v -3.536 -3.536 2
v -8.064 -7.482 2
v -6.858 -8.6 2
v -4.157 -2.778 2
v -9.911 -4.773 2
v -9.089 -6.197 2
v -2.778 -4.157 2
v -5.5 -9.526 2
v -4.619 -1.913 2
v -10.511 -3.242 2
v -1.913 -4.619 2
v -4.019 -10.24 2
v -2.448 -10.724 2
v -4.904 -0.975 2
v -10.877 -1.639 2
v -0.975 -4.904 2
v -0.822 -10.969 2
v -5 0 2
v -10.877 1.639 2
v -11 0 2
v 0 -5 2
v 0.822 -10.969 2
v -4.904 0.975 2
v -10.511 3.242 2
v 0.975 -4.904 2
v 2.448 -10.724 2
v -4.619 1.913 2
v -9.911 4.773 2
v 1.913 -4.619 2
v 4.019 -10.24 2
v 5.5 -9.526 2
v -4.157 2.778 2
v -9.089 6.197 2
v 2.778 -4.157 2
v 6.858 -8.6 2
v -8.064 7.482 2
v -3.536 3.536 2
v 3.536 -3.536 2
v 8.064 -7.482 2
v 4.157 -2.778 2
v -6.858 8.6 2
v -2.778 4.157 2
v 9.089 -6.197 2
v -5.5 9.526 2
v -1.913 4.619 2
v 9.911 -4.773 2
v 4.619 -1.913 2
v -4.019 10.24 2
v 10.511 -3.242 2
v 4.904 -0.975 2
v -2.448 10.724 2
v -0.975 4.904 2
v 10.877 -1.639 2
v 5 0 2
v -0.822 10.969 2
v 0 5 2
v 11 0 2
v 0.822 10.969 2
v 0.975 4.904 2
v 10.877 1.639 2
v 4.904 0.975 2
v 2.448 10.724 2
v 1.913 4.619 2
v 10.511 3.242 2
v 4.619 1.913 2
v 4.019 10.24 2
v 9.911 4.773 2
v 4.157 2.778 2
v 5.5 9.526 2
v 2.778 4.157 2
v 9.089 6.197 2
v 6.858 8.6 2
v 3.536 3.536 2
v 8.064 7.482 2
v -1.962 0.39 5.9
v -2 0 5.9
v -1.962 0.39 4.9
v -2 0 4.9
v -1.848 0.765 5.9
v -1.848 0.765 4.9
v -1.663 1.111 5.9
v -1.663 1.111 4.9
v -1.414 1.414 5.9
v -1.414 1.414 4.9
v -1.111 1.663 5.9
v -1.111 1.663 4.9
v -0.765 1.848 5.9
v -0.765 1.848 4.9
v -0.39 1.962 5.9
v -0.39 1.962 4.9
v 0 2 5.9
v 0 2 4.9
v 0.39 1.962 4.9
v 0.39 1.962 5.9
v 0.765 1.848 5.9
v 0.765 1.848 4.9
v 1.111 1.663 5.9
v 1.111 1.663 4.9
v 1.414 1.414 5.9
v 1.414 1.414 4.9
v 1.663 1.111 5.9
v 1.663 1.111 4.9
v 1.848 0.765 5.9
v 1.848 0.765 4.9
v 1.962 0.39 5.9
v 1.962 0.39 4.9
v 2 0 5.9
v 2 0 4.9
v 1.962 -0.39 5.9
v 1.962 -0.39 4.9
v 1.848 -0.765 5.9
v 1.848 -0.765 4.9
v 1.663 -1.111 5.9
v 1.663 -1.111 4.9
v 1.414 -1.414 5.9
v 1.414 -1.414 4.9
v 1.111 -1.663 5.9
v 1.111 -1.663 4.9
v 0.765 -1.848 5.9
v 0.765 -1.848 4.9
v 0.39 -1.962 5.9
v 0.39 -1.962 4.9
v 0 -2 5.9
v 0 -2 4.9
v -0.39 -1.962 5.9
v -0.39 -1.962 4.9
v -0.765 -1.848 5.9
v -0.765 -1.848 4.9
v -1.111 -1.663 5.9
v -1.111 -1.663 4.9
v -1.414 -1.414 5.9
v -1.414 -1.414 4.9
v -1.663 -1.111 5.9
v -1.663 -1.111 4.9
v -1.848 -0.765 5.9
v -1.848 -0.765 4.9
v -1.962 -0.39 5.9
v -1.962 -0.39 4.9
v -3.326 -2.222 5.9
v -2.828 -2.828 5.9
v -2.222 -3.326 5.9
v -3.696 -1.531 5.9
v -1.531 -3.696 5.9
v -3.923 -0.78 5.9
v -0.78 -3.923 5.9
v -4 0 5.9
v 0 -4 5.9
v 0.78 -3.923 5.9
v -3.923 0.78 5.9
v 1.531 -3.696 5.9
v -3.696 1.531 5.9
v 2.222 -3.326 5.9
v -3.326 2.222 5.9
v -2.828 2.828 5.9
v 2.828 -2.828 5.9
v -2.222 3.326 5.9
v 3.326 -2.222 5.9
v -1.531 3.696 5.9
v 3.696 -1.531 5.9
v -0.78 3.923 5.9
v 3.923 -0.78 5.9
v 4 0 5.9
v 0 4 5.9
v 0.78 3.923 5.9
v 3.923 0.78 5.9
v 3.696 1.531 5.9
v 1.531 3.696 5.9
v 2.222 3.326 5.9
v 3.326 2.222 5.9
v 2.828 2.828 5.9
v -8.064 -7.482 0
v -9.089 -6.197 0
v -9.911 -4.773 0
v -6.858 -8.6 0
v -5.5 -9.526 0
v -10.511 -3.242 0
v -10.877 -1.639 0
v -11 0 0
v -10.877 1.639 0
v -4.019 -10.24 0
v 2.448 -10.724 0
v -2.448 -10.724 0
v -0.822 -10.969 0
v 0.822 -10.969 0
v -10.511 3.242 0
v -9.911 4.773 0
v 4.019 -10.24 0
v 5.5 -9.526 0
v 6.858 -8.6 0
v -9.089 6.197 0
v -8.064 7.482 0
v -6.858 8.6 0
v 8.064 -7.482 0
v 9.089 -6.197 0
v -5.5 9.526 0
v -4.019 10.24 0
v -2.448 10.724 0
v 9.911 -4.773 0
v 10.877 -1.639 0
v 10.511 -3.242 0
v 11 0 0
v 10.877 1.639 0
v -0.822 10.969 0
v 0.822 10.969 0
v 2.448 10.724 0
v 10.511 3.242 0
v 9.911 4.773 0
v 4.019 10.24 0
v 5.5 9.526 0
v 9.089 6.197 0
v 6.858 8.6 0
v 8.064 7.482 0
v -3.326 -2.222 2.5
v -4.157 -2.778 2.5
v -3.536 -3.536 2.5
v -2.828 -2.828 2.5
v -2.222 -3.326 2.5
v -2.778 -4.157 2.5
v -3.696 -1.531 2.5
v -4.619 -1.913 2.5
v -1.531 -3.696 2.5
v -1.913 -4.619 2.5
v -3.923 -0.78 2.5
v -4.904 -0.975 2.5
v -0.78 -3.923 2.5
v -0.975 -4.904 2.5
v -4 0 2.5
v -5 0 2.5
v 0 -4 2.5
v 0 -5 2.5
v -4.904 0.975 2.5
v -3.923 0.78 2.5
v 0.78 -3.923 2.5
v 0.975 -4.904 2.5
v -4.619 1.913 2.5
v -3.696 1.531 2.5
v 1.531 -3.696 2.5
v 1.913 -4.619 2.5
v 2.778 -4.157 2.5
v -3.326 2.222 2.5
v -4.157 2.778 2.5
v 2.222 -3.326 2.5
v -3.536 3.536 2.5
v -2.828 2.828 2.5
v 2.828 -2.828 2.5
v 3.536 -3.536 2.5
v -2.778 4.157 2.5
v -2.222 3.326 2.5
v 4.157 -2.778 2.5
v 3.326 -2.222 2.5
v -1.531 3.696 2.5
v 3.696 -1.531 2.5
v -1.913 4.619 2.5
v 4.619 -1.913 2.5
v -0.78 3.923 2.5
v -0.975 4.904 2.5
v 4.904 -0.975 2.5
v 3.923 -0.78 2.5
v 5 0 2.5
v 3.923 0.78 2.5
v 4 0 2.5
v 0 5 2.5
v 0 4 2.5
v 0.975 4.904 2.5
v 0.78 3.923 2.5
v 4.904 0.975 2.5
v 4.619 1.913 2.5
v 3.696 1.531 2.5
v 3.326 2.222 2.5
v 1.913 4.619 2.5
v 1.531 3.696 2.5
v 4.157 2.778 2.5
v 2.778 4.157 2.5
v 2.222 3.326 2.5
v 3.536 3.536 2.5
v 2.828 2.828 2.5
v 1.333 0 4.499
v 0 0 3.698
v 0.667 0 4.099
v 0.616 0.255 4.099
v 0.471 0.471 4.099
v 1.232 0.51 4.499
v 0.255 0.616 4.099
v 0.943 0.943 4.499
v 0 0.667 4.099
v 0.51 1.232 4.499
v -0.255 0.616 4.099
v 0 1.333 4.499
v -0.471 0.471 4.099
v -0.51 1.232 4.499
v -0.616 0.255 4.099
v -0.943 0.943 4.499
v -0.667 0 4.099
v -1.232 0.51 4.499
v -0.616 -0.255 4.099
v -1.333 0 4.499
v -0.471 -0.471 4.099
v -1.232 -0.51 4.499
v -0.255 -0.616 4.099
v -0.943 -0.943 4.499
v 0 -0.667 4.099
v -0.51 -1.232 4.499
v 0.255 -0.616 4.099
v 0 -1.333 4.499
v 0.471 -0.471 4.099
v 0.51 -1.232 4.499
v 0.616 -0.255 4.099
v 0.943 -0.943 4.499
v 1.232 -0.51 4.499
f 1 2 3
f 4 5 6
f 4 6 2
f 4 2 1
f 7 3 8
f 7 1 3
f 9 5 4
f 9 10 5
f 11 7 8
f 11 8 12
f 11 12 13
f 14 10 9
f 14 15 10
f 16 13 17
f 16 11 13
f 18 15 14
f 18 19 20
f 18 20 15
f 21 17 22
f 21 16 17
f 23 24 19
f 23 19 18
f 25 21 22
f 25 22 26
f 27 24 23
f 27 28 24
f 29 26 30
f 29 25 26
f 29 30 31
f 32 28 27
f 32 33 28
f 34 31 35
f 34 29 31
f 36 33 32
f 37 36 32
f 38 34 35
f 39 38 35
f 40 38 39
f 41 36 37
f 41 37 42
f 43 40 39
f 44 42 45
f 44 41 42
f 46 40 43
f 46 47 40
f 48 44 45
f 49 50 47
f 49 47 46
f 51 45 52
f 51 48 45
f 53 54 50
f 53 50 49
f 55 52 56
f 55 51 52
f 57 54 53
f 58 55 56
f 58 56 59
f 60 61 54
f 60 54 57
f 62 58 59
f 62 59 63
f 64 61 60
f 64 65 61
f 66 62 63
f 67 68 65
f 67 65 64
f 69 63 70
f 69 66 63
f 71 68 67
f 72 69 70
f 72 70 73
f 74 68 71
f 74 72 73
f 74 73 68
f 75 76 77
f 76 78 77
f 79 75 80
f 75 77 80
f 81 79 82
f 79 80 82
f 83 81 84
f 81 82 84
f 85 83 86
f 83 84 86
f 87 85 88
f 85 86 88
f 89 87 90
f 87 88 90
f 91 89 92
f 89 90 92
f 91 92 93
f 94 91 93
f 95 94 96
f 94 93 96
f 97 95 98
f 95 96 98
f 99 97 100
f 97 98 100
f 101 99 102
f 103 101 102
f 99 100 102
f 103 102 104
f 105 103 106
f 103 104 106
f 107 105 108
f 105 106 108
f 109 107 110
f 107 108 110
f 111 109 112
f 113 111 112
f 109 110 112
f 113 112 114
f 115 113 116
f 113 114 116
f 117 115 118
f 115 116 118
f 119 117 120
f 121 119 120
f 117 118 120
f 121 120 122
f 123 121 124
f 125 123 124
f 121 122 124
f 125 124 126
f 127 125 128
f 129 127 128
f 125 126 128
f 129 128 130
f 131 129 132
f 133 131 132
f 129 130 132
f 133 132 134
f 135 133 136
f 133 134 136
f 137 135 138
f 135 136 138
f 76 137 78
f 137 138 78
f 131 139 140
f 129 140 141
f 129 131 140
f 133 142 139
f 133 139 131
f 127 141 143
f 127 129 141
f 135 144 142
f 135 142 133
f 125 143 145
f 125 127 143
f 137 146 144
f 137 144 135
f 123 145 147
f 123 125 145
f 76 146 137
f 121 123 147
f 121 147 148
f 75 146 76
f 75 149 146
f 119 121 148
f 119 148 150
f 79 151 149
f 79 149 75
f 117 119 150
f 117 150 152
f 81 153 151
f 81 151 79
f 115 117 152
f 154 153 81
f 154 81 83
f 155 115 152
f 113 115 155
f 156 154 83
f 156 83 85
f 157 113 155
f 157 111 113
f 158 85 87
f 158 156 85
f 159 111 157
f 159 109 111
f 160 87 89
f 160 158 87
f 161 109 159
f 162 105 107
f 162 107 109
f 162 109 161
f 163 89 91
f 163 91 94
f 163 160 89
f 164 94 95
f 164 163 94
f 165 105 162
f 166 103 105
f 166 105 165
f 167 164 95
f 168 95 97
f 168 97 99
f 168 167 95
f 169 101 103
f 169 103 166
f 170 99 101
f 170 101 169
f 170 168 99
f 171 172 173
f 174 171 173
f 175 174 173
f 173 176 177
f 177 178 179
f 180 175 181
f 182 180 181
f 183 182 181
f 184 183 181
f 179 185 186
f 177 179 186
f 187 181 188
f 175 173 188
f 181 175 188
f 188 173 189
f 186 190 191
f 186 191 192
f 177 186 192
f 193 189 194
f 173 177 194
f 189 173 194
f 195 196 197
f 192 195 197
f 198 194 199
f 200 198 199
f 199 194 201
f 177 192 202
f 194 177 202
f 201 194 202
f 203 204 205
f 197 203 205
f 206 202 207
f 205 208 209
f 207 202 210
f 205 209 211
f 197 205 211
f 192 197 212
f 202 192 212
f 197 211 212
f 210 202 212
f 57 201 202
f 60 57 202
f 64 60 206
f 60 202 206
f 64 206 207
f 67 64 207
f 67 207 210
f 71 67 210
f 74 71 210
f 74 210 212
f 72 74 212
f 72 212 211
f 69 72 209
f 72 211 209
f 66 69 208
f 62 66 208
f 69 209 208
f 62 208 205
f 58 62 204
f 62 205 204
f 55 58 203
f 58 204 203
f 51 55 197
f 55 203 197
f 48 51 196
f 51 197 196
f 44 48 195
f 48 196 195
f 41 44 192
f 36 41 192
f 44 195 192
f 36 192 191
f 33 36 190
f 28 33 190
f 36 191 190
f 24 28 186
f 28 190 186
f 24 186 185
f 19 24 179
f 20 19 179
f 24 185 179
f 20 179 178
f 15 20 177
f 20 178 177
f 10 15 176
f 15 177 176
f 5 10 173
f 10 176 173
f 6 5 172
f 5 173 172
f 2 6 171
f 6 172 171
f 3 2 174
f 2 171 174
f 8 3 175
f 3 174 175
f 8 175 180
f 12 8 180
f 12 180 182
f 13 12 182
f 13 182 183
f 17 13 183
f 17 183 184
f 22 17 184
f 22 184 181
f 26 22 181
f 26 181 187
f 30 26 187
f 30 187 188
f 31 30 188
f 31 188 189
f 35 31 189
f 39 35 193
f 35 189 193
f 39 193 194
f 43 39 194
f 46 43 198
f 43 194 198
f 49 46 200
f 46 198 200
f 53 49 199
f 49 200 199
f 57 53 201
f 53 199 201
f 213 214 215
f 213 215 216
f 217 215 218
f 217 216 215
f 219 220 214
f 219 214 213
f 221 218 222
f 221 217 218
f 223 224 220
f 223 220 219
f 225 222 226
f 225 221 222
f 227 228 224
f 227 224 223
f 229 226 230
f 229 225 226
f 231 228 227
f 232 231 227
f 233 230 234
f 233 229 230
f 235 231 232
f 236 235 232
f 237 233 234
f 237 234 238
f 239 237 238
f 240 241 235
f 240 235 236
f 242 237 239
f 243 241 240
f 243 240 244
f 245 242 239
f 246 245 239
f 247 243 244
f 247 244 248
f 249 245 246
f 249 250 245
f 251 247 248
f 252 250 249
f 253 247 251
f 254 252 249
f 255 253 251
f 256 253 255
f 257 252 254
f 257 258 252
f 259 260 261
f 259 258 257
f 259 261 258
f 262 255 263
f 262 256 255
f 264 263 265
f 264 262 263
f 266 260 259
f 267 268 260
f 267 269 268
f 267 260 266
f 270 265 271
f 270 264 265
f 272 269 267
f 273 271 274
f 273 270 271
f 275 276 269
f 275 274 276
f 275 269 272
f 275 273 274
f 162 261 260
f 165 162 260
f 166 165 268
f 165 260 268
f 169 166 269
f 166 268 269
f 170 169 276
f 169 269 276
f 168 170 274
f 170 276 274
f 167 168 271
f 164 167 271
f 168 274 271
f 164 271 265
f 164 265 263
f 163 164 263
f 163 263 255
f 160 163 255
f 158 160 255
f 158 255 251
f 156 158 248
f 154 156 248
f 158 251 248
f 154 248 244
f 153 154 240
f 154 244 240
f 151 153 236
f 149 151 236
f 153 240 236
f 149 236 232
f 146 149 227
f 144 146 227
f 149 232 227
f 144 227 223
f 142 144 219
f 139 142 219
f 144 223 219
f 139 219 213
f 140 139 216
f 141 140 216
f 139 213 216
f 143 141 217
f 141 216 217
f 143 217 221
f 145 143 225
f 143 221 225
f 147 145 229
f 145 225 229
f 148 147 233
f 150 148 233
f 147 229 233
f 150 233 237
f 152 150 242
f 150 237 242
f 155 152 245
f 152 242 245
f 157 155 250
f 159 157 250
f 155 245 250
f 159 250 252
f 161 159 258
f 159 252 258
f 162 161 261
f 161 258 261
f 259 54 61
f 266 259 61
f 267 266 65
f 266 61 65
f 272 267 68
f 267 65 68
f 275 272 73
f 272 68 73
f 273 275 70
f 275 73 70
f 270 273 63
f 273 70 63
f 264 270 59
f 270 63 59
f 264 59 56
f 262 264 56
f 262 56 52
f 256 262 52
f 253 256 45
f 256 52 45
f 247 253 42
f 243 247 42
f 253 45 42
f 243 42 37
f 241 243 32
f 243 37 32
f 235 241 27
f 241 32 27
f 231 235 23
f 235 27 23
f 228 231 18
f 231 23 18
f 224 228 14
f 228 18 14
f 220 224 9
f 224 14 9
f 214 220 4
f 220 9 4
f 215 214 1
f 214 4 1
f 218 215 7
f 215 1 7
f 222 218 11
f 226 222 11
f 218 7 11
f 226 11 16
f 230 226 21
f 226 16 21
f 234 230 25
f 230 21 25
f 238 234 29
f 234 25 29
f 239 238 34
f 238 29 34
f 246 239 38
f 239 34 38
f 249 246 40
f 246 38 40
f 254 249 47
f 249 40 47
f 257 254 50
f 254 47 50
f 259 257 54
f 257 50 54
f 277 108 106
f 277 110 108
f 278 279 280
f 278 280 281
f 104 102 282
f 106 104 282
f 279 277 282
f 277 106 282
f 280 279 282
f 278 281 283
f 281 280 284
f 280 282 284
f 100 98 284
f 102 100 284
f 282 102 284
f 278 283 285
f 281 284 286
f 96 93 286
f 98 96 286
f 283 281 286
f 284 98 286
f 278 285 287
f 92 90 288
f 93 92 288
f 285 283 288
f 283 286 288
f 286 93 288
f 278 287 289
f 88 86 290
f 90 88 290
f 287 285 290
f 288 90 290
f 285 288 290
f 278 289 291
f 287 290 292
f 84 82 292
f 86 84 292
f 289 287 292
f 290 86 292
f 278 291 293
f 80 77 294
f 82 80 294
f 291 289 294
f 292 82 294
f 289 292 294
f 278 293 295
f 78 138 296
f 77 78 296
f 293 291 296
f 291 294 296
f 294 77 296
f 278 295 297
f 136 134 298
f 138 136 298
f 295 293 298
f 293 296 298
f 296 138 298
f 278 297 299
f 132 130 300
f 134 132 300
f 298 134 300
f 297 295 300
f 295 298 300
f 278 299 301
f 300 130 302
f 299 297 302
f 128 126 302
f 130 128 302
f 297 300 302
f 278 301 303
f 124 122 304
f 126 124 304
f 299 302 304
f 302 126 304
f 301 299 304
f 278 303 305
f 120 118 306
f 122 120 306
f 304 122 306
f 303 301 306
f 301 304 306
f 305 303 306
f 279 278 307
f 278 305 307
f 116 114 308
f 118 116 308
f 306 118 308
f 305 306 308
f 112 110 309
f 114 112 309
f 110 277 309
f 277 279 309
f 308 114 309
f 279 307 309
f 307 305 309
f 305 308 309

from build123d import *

# Parameters (mm, degrees)
F0_R     = 11
F1_DEPTH = 2
F2_R     = 5
F3_DEPTH = 0.5
F4_R     = 4
F5_DEPTH = 3.4
F7_D     = 4
F7_DEPTH = 1
F7_TIP   = 1.2017212381


with BuildPart() as f1:
    # F0 (on Top) → F1 (new body)
    with BuildSketch(Plane.XY):
        Circle(F0_R)
    extrude(amount=F1_DEPTH)

    # F2 (on face) → F3 (join)
    with BuildSketch(Plane.XY.offset(2)):
        Circle(F2_R)
    extrude(amount=F3_DEPTH)

    # F4 (on face) → F5 (join)
    with BuildSketch(Plane.XY.offset(2.5)):
        Circle(F4_R)
    extrude(amount=F5_DEPTH)

    # F7
    with Locations(Plane.XY.offset(5.9)):
        with Locations((0, 0)):
            Hole(F7_D / 2, depth=F7_DEPTH)
            with Locations((0, 0, -(F7_DEPTH + F7_TIP / 2))):  # 118° drill point
                Cone(0, F7_D / 2, F7_TIP, mode=Mode.SUBTRACT)


solid = f1.part
